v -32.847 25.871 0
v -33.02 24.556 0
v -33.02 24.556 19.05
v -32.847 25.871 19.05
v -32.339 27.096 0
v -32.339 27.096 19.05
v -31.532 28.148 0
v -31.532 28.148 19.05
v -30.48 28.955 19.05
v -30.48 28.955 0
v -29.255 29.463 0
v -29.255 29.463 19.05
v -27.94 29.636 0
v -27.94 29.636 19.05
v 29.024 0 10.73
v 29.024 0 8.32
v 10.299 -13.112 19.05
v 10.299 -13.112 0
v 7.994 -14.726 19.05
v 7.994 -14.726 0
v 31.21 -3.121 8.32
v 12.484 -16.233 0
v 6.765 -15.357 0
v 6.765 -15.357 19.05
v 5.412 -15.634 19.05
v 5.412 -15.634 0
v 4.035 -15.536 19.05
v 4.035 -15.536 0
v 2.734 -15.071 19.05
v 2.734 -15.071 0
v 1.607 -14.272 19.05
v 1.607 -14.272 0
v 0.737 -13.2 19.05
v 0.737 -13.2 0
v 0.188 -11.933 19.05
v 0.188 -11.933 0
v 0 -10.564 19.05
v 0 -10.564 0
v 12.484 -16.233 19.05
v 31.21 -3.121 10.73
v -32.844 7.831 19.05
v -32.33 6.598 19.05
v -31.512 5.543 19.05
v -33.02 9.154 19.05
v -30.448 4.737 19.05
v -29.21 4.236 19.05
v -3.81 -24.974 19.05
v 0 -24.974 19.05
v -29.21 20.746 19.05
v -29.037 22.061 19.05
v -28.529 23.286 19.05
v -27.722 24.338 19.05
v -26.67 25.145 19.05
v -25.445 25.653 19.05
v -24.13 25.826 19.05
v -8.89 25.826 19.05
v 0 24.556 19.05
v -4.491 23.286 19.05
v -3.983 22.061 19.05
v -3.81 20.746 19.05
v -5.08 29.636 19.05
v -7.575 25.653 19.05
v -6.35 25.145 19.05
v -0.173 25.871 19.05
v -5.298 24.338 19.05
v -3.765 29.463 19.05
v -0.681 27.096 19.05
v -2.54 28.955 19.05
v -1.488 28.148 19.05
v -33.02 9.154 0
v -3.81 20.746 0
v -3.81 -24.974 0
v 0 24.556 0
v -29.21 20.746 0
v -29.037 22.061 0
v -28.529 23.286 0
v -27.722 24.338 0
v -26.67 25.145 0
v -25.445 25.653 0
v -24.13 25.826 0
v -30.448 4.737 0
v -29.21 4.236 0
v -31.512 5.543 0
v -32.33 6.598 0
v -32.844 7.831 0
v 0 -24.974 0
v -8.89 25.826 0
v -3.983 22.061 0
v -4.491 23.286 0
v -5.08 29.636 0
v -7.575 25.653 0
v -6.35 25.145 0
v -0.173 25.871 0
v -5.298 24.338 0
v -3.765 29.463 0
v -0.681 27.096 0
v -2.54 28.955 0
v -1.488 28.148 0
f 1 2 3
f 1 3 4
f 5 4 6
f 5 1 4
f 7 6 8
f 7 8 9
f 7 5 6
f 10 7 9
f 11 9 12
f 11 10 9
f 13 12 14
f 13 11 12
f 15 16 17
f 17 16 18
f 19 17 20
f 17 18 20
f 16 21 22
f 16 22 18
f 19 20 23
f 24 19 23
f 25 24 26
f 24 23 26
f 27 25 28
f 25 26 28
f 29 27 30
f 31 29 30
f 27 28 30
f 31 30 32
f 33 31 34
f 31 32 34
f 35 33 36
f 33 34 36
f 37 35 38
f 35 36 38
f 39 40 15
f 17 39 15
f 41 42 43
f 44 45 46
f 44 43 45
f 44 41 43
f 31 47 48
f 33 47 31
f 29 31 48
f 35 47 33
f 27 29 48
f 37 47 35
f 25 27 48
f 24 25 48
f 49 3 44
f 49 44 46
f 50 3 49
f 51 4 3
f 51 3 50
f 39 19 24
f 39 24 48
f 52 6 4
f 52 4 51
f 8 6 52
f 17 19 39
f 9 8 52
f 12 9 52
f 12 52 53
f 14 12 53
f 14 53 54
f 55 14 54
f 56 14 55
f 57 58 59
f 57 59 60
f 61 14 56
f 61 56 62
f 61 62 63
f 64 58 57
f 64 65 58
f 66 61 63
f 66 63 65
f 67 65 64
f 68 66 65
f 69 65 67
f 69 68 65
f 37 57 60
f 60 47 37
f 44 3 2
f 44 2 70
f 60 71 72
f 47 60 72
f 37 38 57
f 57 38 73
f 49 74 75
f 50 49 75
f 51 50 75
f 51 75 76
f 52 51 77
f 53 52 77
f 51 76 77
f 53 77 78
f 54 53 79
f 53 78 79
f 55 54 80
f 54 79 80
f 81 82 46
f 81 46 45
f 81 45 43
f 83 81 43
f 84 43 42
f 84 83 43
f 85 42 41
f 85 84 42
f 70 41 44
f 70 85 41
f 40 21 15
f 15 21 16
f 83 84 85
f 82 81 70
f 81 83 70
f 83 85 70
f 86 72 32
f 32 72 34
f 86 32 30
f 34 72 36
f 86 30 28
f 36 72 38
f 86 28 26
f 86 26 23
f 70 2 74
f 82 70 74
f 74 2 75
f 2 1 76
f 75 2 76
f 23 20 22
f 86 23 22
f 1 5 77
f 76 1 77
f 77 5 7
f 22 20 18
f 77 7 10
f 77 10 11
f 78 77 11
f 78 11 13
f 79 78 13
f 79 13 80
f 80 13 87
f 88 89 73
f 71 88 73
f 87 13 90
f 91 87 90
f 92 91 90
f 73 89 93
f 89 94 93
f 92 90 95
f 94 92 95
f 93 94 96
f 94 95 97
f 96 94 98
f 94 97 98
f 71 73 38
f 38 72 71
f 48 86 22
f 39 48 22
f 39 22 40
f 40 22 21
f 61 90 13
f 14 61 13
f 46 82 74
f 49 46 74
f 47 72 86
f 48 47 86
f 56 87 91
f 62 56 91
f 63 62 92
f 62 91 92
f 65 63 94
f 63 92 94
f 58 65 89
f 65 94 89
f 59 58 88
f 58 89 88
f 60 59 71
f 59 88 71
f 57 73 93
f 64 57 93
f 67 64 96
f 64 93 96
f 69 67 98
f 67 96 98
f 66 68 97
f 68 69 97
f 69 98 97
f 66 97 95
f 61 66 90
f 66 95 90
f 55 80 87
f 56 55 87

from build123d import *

# Parameters (mm, degrees)
F1_DEPTH     = 19.05
F2_T1_DEPTH  = 19.05
F2_T3_DEPTH  = 19.05
F2_T5_DEPTH  = 19.05
F2_T7_DEPTH  = 44.45
F2_T9_DEPTH  = 44.45
F2_T11_DEPTH = 43.6434442484
F3_SIZE2     = 8.3203595553
F3_SIZE      = 22.86
F3_2_SIZE2   = 8.3203595553
F3_2_SIZE    = 22.86


# Not quite as in the source:
# - a fillet or chamfer that OpenCascade refuses, or shapes differently, is made with other operations: its cross-section is extruded or revolved along the edge and cut away or added


with BuildPart() as f1:
    # F0 (on Top) → F1 (new body)
    with BuildSketch(Plane.XY):
        Polygon((-33.02, 29.6357684863), (-33.02, 4.2357684863), (-29.21, 4.2357684863), (-29.21, 25.8257684863), (-3.81, 25.8257684863), (-3.81, -24.9742315137), (0, -24.9742315137), (31.2096928874, -3.1209692887), (29.0243666649, 0), (0, -20.3230803305), (0, 29.6357684863), align=None)
    extrude(amount=F1_DEPTH)

    # F2: fillet of radius 5.08 on 6 edges, made by hand

    # F2_s2 → F2_t1 (join)
    with BuildSketch(Plane.XY):
        with BuildLine():
            ThreePointArc((7.9937682967, -14.7257835105), (2.7343170448, -15.0705061581), (0, -10.5644911255))
            Line((0, -10.5644911255), (0, -20.3230803305))
            Line((0, -20.3230803305), (7.9937682967, -14.7257835105))
        make_face()
    extrude(amount=F2_T1_DEPTH)

    # F2_s4 → F2_t3 (join)
    with BuildSketch(Plane.XY):
        with BuildLine():
            ThreePointArc((-29.21, 20.7457684863), (-27.7221024484, 24.3378709347), (-24.13, 25.8257684863))
            Line((-24.13, 25.8257684863), (-29.21, 25.8257684863))
            Line((-29.21, 25.8257684863), (-29.21, 20.7457684863))
        make_face()
    extrude(amount=F2_T3_DEPTH)

    # F2_s6 → F2_t5 (join)
    with BuildSketch(Plane.XY):
        with BuildLine():
            ThreePointArc((-8.89, 25.8257684863), (-5.2978975516, 24.3378709347), (-3.81, 20.7457684863))
            Line((-3.81, 20.7457684863), (-3.81, 25.8257684863))
            Line((-3.81, 25.8257684863), (-8.89, 25.8257684863))
        make_face()
    extrude(amount=F2_T5_DEPTH)

    # F2_s8 → F2_t7 (cut)
    with BuildSketch(Plane.XY.offset(-12.7)):
        with BuildLine():
            ThreePointArc((0, 24.5557684863), (-1.4878975516, 28.1478709347), (-5.08, 29.6357684863))
            Line((-5.08, 29.6357684863), (0, 29.6357684863))
            Line((0, 29.6357684863), (0, 24.5557684863))
        make_face()
    extrude(amount=F2_T7_DEPTH, mode=Mode.SUBTRACT)

    # F2_s10 → F2_t9 (cut)
    with BuildSketch(Plane.XY.offset(-12.7)):
        with BuildLine():
            ThreePointArc((-33.02, 24.5557684863), (-31.5321024484, 28.1478709347), (-27.94, 29.6357684863))
            Line((-27.94, 29.6357684863), (-33.02, 29.6357684863))
            Line((-33.02, 29.6357684863), (-33.02, 24.5557684863))
        make_face()
    extrude(amount=F2_T9_DEPTH, mode=Mode.SUBTRACT)

    # F2_s12 → F2_t11 (cut)
    with BuildSketch(Plane.XY.offset(-12.2967221242)):
        with BuildLine():
            ThreePointArc((-29.21, 4.2357684863), (-31.9560926284, 6.0436053626), (-33.02, 9.154457336))
            Line((-33.02, 9.154457336), (-33.02, 4.2357684863))
            Line((-33.02, 4.2357684863), (-29.21, 4.2357684863))
        make_face()
    extrude(amount=F2_T11_DEPTH, mode=Mode.SUBTRACT)

    # F3
    f3_edges = [f1.edges().sort_by_distance(p)[0] for p in [
        (30.11703, -1.560485, 19.05),
    ]]
    f3_side = f1.faces().sort_by_distance((-2.966928, -2.114232, 19.05))[0]
    chamfer(f3_edges, length=F3_SIZE, length2=F3_SIZE2, reference=f3_side)

    # F3#2
    f3_2_edges = [f1.edges().sort_by_distance(p)[0] for p in [
        (30.11703, -1.560485, 0),
    ]]
    f3_2_side = f1.faces().sort_by_distance((-2.966928, -2.114232, 0))[0]
    chamfer(f3_2_edges, length=F3_2_SIZE, length2=F3_2_SIZE2, reference=f3_2_side)


solid = f1.part
